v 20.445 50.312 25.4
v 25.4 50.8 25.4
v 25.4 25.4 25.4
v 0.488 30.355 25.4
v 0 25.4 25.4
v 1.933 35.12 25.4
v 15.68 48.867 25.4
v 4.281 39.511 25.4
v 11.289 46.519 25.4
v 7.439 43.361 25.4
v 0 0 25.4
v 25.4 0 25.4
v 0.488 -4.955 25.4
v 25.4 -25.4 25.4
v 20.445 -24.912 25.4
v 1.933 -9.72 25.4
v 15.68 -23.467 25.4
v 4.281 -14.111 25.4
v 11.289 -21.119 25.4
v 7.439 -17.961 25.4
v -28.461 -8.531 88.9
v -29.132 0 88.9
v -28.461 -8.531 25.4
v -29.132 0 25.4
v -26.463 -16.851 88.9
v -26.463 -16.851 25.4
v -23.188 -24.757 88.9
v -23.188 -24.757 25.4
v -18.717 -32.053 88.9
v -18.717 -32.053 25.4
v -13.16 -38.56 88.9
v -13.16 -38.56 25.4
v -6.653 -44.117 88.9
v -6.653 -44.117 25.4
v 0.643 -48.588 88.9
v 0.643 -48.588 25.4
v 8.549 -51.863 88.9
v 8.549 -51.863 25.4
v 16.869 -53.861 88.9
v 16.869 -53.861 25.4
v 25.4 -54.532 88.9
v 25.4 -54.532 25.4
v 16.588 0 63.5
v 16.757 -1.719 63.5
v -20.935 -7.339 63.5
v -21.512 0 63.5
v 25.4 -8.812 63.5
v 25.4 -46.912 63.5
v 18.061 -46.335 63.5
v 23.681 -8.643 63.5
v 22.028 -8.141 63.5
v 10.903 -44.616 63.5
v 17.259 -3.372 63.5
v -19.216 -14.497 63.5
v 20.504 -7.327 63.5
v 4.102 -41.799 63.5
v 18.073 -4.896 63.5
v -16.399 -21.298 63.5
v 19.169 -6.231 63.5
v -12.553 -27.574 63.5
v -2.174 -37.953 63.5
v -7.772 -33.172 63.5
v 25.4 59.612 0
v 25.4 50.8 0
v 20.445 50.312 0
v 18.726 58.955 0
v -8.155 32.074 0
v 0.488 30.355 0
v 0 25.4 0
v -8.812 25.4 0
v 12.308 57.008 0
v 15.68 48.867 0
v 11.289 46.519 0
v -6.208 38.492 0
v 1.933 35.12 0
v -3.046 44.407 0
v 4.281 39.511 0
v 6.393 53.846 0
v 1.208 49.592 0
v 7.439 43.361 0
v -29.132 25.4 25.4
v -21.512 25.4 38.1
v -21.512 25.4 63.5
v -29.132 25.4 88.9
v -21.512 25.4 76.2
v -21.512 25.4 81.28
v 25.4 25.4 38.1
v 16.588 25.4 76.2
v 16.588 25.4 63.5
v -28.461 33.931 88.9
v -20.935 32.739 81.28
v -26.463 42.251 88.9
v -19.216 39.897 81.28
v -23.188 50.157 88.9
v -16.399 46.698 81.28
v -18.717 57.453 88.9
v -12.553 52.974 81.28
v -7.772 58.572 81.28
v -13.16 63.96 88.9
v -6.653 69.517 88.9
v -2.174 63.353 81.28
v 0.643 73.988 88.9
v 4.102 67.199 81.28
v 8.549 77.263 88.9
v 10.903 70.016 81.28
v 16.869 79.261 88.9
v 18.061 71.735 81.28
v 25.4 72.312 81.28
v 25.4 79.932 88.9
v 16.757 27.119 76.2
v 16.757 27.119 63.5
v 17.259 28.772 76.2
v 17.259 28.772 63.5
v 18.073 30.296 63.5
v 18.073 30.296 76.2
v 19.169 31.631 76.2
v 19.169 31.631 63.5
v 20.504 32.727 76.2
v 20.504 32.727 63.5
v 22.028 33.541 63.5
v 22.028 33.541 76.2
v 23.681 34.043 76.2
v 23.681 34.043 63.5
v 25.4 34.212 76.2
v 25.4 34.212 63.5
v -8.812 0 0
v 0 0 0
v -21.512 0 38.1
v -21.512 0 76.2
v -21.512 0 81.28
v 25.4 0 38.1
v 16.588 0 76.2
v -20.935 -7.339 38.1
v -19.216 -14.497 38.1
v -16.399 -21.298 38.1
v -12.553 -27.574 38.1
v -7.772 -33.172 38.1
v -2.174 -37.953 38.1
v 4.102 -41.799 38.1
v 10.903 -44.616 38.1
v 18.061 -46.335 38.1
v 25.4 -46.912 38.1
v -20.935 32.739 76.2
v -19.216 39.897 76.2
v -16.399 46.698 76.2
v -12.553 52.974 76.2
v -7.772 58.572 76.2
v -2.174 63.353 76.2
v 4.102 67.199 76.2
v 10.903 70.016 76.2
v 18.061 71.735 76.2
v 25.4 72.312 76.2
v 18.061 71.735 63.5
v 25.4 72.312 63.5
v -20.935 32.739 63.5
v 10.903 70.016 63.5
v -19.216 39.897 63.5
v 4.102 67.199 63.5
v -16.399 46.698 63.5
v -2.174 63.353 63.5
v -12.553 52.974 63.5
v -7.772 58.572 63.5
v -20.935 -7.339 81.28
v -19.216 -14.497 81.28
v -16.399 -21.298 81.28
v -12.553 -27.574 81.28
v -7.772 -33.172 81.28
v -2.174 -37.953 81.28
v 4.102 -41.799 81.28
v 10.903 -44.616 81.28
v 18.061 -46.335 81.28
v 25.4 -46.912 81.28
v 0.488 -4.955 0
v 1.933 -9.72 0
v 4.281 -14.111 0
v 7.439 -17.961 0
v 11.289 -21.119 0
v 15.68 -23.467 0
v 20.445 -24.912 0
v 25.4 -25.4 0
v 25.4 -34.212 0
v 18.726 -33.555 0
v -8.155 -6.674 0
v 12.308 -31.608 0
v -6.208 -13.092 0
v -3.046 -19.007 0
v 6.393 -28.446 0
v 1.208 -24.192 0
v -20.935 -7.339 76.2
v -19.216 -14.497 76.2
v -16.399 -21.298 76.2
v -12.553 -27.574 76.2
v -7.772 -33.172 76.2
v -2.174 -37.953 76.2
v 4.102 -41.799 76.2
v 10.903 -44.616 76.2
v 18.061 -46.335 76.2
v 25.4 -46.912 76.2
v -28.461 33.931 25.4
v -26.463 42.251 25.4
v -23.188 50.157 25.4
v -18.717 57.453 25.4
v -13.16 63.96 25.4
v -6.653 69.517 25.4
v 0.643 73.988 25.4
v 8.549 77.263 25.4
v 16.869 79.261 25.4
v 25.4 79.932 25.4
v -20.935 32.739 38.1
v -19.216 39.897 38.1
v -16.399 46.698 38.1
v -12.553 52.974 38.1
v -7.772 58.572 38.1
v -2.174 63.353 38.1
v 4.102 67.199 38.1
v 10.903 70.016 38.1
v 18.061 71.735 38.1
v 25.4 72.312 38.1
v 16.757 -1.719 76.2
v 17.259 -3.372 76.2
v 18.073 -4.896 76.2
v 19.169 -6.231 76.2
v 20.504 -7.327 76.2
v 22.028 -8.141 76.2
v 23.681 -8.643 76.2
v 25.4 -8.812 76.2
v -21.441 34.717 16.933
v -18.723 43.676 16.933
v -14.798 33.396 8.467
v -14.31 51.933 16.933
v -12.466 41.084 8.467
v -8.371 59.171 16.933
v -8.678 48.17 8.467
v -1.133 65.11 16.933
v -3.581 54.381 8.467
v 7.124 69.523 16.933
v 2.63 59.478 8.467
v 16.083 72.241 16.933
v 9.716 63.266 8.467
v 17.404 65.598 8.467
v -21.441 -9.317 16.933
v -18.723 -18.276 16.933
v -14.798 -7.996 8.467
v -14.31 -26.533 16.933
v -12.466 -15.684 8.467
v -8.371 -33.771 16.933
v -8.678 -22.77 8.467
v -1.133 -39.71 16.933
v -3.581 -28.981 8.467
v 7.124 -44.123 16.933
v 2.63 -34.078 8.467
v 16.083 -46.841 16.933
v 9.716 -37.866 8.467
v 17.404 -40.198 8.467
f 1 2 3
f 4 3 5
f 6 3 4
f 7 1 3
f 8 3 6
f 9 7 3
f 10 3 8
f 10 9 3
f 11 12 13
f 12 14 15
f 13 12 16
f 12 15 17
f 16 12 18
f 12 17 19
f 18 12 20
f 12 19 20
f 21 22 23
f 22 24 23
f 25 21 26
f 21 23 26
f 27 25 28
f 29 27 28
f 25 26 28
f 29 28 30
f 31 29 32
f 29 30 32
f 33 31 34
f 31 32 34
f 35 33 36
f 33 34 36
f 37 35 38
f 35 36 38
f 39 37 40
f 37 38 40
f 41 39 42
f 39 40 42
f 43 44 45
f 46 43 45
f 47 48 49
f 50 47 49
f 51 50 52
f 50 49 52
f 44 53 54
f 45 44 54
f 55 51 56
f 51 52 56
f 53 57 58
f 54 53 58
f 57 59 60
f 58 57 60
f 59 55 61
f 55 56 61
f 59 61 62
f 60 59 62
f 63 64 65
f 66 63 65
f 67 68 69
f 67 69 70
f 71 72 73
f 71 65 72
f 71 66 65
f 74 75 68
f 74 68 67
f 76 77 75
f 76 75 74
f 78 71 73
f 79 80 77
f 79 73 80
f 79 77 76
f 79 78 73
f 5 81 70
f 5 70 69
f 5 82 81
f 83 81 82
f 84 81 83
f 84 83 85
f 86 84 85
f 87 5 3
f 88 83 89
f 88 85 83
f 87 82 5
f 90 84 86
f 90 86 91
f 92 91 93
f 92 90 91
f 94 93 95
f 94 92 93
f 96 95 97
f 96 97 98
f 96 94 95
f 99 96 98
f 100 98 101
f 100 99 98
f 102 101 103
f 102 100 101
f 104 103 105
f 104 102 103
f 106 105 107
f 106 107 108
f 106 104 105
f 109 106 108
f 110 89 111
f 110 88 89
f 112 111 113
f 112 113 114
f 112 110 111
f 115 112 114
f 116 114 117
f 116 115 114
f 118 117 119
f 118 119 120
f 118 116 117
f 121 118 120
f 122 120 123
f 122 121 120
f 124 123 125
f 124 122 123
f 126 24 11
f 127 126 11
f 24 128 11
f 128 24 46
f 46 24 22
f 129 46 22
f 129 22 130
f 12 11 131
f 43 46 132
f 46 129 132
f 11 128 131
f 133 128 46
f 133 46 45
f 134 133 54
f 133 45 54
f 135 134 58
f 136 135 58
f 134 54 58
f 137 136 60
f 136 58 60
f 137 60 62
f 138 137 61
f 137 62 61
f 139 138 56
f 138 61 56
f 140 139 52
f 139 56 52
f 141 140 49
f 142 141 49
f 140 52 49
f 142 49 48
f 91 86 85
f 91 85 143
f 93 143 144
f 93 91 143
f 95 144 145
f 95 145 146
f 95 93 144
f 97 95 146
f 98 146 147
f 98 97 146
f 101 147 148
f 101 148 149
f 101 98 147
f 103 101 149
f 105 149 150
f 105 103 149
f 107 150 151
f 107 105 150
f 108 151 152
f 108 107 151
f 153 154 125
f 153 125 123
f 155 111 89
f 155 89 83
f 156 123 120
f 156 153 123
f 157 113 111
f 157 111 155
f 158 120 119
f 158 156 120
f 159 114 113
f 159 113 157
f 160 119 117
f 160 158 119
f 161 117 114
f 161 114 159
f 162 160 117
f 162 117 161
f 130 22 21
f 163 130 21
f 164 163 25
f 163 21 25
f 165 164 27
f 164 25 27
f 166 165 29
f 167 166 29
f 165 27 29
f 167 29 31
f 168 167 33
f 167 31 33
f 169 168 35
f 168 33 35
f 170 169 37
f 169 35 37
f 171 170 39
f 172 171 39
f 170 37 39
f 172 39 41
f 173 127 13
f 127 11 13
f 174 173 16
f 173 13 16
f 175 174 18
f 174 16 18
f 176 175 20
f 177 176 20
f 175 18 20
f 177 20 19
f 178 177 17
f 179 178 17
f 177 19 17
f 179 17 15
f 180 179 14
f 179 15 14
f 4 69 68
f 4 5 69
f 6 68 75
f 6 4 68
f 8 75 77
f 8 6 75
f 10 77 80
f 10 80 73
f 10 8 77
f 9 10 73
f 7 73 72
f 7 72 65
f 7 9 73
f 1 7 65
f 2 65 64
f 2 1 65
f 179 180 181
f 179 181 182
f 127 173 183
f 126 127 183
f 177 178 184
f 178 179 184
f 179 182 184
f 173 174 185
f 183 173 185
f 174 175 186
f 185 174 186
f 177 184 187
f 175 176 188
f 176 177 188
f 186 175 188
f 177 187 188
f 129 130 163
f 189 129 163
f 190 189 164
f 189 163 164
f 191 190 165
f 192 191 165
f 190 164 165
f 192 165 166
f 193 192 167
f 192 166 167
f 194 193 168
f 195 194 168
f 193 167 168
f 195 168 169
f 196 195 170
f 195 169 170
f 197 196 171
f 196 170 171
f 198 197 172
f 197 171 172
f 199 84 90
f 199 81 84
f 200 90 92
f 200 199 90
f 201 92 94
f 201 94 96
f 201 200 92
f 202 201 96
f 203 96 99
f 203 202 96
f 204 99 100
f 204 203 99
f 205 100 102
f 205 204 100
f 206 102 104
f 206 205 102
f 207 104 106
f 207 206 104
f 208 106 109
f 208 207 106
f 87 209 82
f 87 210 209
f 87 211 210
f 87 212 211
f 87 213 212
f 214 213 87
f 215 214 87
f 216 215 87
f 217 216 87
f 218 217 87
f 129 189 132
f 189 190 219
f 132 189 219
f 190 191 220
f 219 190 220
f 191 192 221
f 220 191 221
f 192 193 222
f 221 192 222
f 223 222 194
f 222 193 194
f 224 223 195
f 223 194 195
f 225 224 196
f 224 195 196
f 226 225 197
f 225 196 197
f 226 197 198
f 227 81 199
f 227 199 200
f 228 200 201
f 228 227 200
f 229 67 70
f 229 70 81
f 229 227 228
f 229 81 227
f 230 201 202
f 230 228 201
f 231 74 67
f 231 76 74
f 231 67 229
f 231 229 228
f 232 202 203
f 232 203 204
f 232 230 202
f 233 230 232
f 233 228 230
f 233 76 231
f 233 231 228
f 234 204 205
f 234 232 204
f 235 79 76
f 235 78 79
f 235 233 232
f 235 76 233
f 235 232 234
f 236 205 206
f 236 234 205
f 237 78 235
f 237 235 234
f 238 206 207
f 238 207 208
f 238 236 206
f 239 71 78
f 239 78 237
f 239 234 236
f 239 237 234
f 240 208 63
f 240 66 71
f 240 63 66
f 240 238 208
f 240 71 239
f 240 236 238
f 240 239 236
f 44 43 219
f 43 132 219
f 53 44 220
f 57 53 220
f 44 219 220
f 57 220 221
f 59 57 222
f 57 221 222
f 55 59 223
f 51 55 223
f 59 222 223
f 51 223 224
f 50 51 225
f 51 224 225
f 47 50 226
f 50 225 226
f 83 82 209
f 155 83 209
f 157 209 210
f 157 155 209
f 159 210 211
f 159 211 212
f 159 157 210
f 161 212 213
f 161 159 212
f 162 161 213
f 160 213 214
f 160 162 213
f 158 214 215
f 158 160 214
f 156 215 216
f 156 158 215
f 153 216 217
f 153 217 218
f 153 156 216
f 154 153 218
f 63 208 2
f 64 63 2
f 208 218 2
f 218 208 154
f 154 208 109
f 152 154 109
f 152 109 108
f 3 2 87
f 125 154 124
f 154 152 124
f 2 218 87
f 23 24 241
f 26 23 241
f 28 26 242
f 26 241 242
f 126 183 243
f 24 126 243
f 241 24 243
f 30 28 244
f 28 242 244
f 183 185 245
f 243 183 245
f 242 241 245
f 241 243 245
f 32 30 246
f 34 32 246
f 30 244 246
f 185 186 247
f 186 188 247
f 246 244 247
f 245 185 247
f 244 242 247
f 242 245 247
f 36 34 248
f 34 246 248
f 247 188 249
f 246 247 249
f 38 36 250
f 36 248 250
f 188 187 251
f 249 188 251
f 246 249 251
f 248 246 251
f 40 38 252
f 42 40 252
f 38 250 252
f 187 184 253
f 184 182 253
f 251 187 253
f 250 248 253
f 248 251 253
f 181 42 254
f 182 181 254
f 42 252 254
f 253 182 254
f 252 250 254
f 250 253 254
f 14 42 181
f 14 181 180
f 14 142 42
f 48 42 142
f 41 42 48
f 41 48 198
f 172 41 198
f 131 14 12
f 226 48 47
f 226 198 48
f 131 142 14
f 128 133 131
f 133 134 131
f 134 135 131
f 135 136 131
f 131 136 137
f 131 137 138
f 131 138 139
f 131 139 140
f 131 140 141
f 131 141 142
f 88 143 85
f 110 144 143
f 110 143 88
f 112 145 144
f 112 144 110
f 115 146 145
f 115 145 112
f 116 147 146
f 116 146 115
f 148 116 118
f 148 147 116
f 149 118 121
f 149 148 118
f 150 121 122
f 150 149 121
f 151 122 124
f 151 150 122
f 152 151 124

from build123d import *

# Parameters (mm, degrees)
F1_ANGLE = 90
F2_SIZE  = 7.61999


# Not quite as in the source:
# - a fillet or chamfer is up to 0.001 mm smaller than in the source, because OpenCascade refuses the exact size


with BuildPart() as f1:
    # F0 (on Front) → F1 (revolve)
    with BuildSketch(Plane.XZ):
        Polygon((-8.8121203113, 0), (0, 0), (0, 25.4), (25.4, 25.4), (25.4, 38.1), (-21.5121203113, 38.1), (-21.5121203113, 63.5), (16.5878796887, 63.5), (16.5878796887, 76.2), (-21.5121203113, 76.2), (-21.5121203113, 88.9), (-29.1321203113, 88.9), (-29.1321203113, 25.4), align=None)
    revolve(axis=Axis((25.4, 0, 31.75), (0, 0, 1)), revolution_arc=F1_ANGLE)

    # F2 (size 7.62 in the source; OpenCascade refuses exactly that, so slightly less here)
    f2_edges = [f1.edges().sort_by_distance(p)[0] for p in [
        (-7.771878, -33.171878, 88.9),
    ]]
    chamfer(f2_edges, length=F2_SIZE)


with BuildPart() as f4_1:
    # F4: instance of F1
    add(f1.part.mirror(Plane(origin=(-8.2304534557, 12.7, 42.1908362941), x_dir=(-1, 0, 0), z_dir=(0, 1, 0))))


solid = Compound([f1.part, f4_1.part])
